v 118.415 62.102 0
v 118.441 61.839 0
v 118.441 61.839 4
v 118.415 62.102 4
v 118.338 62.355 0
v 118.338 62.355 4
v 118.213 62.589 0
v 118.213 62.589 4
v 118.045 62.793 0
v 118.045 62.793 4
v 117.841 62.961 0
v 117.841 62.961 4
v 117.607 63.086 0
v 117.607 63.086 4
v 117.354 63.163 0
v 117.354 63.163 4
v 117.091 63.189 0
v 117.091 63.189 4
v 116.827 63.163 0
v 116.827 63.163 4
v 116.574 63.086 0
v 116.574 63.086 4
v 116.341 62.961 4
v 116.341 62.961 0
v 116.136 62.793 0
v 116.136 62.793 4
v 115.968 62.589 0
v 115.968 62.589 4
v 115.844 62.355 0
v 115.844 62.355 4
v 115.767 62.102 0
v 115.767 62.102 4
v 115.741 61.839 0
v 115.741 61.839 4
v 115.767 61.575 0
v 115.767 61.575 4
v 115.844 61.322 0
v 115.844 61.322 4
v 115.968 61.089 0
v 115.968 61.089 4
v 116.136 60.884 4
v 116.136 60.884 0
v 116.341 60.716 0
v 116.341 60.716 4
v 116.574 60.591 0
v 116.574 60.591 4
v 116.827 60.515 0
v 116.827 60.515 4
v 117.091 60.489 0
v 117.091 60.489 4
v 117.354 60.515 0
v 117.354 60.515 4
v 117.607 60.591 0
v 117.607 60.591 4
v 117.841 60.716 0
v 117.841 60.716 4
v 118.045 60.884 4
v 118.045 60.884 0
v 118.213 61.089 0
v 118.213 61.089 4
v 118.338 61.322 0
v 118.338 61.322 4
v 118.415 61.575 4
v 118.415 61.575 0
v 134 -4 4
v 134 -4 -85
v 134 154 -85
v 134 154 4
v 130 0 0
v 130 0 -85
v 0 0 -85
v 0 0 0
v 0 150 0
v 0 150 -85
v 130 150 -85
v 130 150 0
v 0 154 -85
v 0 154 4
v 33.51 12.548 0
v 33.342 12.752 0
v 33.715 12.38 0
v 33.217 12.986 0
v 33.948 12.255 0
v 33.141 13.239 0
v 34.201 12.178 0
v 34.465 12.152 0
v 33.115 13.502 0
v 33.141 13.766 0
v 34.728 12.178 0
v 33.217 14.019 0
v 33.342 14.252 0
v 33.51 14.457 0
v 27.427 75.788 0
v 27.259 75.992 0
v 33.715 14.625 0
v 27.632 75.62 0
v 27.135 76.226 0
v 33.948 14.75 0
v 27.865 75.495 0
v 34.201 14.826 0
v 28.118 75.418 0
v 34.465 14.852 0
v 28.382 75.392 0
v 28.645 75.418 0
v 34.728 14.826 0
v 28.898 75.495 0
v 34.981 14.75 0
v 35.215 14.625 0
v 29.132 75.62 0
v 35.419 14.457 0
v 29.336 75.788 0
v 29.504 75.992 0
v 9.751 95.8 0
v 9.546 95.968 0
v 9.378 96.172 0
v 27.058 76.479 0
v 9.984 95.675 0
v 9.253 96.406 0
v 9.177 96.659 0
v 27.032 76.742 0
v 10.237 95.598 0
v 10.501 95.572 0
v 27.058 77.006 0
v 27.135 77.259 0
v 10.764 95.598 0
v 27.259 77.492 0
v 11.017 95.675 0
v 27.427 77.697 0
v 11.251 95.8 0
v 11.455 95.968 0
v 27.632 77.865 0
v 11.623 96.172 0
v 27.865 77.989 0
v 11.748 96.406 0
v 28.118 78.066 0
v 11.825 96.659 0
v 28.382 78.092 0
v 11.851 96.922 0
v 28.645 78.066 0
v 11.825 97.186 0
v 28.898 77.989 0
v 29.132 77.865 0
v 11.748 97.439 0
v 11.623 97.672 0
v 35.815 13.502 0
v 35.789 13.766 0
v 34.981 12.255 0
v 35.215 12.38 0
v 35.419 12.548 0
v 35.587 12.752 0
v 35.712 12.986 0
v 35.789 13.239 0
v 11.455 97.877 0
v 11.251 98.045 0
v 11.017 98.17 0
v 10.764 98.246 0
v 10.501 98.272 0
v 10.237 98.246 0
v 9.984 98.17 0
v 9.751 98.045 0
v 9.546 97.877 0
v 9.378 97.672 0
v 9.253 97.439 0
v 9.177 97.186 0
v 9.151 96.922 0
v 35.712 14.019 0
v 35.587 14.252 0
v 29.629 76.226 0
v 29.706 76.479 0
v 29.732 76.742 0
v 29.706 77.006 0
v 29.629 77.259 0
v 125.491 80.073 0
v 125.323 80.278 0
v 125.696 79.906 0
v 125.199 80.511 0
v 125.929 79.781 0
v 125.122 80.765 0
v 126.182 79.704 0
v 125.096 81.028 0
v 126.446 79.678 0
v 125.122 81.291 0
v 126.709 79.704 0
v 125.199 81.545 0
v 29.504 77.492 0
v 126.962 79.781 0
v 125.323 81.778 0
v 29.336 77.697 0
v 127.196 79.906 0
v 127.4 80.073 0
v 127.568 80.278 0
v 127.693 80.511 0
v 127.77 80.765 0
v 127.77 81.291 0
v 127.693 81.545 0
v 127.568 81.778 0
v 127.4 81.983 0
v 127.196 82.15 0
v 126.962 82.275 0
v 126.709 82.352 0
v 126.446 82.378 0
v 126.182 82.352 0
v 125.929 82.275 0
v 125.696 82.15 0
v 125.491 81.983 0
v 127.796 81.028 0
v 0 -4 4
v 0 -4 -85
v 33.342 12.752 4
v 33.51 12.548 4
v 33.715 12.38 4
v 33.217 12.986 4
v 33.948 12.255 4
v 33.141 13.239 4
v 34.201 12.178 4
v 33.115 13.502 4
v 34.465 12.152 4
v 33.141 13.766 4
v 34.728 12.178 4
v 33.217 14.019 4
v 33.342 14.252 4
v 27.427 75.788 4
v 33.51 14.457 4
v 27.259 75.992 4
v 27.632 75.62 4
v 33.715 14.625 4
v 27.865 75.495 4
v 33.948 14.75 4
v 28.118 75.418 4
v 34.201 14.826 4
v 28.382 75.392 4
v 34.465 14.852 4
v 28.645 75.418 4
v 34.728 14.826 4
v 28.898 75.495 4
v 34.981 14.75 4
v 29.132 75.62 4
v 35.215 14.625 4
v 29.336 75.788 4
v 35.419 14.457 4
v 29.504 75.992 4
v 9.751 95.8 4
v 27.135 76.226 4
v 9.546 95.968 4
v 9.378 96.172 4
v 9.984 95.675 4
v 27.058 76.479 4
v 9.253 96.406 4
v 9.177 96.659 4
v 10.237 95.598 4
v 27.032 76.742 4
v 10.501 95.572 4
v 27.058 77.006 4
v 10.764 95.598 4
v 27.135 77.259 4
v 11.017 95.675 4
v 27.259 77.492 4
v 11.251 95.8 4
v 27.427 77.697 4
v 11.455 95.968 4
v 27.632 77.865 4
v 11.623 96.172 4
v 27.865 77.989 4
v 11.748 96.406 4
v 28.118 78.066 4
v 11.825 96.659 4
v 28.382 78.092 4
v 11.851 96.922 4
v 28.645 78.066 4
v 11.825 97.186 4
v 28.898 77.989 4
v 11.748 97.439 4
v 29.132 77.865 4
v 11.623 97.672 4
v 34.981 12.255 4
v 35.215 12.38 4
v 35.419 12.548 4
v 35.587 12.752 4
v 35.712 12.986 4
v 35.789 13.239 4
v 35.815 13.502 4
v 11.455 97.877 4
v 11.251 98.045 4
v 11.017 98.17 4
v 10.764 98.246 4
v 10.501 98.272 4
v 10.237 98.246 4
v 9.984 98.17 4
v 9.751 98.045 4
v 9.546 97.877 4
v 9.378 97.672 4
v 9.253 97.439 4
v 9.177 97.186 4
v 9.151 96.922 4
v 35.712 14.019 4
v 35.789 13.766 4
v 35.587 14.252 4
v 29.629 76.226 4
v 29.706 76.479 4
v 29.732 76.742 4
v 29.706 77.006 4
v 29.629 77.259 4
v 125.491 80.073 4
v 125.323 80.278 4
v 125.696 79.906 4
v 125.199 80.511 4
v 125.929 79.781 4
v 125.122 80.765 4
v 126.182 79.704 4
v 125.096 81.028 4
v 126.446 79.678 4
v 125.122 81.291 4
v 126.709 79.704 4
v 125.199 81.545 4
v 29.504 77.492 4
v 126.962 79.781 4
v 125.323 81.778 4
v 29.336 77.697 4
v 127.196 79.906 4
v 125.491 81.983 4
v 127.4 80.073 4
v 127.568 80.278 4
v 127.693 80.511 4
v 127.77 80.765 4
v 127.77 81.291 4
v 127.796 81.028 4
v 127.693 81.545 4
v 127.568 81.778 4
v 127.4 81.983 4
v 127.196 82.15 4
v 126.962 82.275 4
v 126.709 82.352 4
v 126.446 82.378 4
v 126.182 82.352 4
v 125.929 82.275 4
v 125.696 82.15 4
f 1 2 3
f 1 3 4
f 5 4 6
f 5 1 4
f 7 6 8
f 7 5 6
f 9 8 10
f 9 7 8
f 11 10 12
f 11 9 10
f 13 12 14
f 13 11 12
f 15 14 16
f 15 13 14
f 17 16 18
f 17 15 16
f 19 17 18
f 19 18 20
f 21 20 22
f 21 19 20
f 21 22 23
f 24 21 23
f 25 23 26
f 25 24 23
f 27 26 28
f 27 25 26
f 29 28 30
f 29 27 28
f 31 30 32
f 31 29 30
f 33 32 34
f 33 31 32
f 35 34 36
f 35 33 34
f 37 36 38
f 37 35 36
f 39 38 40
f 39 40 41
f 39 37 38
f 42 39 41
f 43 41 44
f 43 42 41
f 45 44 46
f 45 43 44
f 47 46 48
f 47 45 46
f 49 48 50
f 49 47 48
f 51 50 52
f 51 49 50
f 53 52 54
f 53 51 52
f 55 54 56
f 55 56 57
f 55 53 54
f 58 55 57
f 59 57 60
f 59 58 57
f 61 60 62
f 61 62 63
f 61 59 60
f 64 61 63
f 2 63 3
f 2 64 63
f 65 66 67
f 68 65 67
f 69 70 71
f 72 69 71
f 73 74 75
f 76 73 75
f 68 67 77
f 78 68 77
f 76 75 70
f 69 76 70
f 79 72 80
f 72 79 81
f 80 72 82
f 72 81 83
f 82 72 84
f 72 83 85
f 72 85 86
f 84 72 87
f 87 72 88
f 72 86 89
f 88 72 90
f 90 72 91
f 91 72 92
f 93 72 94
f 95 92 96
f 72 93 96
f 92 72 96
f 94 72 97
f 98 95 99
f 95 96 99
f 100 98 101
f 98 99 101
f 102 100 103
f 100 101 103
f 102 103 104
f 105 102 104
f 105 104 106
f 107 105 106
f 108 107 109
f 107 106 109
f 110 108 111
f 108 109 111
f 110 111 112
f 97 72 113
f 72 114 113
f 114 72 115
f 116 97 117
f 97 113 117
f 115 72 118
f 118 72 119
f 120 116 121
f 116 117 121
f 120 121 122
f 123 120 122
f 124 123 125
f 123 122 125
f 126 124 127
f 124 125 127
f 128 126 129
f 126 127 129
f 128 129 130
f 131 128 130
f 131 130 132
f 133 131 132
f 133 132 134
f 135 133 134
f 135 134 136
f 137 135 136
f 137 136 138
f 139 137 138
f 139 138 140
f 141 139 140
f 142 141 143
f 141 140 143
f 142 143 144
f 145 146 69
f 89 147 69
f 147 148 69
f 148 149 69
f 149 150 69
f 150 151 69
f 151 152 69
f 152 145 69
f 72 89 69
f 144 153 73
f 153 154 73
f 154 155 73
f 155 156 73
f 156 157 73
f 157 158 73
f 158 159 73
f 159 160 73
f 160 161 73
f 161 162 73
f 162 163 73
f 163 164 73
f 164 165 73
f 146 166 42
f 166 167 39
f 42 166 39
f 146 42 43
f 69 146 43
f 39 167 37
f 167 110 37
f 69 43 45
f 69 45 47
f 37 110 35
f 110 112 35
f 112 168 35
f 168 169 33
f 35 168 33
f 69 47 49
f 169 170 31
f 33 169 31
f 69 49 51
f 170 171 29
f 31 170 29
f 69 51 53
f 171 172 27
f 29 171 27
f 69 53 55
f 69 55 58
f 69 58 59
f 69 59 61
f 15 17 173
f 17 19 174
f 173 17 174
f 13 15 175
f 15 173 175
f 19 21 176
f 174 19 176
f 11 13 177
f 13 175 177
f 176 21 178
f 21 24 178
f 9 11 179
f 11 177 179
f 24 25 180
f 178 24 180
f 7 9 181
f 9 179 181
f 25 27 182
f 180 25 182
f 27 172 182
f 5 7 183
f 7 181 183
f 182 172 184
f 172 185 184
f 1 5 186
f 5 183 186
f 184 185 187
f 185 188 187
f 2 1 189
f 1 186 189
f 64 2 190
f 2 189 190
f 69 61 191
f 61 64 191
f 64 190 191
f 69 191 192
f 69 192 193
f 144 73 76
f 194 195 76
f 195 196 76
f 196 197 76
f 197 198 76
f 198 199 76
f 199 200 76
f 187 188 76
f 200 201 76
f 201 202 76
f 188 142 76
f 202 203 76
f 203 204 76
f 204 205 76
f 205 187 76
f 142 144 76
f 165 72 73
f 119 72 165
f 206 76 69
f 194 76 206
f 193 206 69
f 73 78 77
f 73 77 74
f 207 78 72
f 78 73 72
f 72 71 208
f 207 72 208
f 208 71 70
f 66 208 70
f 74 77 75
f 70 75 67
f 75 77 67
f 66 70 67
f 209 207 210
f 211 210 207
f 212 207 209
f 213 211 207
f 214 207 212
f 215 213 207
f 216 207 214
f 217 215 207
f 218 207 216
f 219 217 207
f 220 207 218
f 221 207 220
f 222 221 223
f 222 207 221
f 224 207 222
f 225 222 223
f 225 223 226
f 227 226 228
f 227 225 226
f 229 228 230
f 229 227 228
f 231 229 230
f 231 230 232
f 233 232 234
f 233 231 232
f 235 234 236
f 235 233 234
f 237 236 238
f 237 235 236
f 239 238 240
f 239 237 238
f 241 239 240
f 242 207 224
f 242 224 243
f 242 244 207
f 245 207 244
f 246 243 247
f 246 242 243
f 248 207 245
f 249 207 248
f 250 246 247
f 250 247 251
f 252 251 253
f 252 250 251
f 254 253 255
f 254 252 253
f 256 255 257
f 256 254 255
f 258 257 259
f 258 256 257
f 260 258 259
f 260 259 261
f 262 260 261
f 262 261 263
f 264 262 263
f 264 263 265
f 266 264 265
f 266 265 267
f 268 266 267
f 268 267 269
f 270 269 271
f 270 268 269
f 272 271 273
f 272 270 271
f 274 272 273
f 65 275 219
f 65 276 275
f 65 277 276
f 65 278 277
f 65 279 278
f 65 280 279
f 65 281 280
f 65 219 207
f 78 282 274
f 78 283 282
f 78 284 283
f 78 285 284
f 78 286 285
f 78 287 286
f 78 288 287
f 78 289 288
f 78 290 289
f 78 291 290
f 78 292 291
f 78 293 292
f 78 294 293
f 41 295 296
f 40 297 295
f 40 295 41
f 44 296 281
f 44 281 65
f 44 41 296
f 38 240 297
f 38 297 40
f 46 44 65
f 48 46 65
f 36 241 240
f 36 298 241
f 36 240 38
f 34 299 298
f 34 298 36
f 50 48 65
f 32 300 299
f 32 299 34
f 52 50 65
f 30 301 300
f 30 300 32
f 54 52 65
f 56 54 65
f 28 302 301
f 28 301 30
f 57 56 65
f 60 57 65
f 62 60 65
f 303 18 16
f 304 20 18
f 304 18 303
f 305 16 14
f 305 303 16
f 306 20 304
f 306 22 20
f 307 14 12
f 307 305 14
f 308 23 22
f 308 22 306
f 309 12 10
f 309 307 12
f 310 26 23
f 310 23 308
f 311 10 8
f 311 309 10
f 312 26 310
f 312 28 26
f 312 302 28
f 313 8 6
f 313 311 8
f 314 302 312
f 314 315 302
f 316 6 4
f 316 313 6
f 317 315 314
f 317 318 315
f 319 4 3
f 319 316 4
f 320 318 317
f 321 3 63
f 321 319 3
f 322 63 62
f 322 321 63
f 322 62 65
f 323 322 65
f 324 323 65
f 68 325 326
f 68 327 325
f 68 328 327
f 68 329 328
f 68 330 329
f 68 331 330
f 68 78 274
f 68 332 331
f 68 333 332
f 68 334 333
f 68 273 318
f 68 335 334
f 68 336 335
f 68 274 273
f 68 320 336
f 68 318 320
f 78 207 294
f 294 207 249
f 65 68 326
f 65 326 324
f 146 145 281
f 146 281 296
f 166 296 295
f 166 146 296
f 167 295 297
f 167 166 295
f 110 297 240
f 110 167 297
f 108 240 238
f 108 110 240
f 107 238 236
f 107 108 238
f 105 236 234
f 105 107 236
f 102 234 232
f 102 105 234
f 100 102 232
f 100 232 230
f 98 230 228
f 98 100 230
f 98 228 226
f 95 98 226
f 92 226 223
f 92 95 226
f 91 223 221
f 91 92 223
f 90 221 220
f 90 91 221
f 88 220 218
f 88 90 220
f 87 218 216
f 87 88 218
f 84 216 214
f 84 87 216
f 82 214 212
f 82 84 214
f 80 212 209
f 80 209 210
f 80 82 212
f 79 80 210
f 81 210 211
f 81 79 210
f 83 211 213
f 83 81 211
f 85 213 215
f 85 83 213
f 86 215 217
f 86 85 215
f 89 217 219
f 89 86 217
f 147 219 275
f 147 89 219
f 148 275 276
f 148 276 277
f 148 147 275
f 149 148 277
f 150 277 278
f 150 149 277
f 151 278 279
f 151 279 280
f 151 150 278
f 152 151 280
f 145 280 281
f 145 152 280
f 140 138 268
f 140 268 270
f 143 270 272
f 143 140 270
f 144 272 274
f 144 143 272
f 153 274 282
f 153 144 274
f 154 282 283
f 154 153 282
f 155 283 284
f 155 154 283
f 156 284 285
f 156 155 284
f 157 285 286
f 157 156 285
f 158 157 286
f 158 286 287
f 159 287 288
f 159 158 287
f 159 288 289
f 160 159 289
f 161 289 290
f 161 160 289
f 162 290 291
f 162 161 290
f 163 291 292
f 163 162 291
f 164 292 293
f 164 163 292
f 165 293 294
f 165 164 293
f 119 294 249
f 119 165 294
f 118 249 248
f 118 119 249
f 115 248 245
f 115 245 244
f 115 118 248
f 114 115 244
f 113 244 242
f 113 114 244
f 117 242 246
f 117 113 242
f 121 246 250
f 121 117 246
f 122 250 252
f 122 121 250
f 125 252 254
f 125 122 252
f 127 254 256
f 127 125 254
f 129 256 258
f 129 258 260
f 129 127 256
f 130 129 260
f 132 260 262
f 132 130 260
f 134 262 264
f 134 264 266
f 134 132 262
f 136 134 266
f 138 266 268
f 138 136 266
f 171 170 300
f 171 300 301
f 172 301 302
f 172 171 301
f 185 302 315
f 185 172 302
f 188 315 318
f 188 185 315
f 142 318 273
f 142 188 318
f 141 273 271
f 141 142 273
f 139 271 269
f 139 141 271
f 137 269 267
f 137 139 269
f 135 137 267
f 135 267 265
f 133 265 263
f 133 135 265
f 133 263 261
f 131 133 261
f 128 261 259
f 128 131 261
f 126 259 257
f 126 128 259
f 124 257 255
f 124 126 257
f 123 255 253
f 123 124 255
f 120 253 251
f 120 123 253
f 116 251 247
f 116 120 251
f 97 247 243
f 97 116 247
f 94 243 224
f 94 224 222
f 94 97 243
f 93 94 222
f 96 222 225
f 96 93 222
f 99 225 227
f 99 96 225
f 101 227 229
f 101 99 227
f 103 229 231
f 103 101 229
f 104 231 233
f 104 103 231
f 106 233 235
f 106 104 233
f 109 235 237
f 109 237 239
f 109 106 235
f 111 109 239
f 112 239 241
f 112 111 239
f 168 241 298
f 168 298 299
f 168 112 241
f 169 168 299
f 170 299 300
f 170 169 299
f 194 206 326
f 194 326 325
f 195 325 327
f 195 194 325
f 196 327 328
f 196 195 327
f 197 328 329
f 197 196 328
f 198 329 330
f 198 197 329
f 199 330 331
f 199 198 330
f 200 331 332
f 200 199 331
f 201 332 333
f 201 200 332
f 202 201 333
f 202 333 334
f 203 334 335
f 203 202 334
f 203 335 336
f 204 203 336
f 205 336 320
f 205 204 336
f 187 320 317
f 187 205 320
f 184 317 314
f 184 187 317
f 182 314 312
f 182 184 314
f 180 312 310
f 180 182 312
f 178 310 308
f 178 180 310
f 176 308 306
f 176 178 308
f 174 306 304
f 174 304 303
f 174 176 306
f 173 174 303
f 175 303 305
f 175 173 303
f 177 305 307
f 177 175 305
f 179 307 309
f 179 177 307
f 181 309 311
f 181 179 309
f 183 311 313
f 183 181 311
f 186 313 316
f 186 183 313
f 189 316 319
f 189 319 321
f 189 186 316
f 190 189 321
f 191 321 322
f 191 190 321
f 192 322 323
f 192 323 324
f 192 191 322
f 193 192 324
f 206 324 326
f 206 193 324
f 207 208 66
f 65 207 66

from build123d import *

# Parameters (mm, degrees)
SKELETON_W          = 134
SKELETON_H          = 158
SKELETON_R          = 1.35
BOSS_EXTRUDE1_DEPTH = 4
BOSS_EXTRUDE2_START = -85
BOSS_EXTRUDE2_DEPTH = 85


with BuildPart() as part:
    # SKELETON → Boss-Extrude1 (new body)
    with BuildSketch(Plane.XY):
        with Locations((67, 75)):
            Rectangle(SKELETON_W, SKELETON_H)
        with Locations((28.381789687, 76.742237148)):
            Circle(SKELETON_R, mode=Mode.SUBTRACT)
        with Locations((10.500607165, 96.922428852)):
            Circle(SKELETON_R, mode=Mode.SUBTRACT)
        with Locations((126.445833013, 81.02799961)):
            Circle(SKELETON_R, mode=Mode.SUBTRACT)
        with Locations((34.46465583, 13.502410031)):
            Circle(SKELETON_R, mode=Mode.SUBTRACT)
        with Locations((117.09085583, 61.838610031)):
            Circle(SKELETON_R, mode=Mode.SUBTRACT)
    extrude(amount=BOSS_EXTRUDE1_DEPTH)

    # SKELETON<3> → Boss-Extrude2 (add)
    with BuildSketch(Plane.XY.offset(BOSS_EXTRUDE2_START)):
        Polygon((134, 154), (0, 154), (0, 150), (130, 150), (130, 0), (0, 0), (0, -4), (134, -4), align=None)
    extrude(amount=BOSS_EXTRUDE2_DEPTH)


solid = part.part
